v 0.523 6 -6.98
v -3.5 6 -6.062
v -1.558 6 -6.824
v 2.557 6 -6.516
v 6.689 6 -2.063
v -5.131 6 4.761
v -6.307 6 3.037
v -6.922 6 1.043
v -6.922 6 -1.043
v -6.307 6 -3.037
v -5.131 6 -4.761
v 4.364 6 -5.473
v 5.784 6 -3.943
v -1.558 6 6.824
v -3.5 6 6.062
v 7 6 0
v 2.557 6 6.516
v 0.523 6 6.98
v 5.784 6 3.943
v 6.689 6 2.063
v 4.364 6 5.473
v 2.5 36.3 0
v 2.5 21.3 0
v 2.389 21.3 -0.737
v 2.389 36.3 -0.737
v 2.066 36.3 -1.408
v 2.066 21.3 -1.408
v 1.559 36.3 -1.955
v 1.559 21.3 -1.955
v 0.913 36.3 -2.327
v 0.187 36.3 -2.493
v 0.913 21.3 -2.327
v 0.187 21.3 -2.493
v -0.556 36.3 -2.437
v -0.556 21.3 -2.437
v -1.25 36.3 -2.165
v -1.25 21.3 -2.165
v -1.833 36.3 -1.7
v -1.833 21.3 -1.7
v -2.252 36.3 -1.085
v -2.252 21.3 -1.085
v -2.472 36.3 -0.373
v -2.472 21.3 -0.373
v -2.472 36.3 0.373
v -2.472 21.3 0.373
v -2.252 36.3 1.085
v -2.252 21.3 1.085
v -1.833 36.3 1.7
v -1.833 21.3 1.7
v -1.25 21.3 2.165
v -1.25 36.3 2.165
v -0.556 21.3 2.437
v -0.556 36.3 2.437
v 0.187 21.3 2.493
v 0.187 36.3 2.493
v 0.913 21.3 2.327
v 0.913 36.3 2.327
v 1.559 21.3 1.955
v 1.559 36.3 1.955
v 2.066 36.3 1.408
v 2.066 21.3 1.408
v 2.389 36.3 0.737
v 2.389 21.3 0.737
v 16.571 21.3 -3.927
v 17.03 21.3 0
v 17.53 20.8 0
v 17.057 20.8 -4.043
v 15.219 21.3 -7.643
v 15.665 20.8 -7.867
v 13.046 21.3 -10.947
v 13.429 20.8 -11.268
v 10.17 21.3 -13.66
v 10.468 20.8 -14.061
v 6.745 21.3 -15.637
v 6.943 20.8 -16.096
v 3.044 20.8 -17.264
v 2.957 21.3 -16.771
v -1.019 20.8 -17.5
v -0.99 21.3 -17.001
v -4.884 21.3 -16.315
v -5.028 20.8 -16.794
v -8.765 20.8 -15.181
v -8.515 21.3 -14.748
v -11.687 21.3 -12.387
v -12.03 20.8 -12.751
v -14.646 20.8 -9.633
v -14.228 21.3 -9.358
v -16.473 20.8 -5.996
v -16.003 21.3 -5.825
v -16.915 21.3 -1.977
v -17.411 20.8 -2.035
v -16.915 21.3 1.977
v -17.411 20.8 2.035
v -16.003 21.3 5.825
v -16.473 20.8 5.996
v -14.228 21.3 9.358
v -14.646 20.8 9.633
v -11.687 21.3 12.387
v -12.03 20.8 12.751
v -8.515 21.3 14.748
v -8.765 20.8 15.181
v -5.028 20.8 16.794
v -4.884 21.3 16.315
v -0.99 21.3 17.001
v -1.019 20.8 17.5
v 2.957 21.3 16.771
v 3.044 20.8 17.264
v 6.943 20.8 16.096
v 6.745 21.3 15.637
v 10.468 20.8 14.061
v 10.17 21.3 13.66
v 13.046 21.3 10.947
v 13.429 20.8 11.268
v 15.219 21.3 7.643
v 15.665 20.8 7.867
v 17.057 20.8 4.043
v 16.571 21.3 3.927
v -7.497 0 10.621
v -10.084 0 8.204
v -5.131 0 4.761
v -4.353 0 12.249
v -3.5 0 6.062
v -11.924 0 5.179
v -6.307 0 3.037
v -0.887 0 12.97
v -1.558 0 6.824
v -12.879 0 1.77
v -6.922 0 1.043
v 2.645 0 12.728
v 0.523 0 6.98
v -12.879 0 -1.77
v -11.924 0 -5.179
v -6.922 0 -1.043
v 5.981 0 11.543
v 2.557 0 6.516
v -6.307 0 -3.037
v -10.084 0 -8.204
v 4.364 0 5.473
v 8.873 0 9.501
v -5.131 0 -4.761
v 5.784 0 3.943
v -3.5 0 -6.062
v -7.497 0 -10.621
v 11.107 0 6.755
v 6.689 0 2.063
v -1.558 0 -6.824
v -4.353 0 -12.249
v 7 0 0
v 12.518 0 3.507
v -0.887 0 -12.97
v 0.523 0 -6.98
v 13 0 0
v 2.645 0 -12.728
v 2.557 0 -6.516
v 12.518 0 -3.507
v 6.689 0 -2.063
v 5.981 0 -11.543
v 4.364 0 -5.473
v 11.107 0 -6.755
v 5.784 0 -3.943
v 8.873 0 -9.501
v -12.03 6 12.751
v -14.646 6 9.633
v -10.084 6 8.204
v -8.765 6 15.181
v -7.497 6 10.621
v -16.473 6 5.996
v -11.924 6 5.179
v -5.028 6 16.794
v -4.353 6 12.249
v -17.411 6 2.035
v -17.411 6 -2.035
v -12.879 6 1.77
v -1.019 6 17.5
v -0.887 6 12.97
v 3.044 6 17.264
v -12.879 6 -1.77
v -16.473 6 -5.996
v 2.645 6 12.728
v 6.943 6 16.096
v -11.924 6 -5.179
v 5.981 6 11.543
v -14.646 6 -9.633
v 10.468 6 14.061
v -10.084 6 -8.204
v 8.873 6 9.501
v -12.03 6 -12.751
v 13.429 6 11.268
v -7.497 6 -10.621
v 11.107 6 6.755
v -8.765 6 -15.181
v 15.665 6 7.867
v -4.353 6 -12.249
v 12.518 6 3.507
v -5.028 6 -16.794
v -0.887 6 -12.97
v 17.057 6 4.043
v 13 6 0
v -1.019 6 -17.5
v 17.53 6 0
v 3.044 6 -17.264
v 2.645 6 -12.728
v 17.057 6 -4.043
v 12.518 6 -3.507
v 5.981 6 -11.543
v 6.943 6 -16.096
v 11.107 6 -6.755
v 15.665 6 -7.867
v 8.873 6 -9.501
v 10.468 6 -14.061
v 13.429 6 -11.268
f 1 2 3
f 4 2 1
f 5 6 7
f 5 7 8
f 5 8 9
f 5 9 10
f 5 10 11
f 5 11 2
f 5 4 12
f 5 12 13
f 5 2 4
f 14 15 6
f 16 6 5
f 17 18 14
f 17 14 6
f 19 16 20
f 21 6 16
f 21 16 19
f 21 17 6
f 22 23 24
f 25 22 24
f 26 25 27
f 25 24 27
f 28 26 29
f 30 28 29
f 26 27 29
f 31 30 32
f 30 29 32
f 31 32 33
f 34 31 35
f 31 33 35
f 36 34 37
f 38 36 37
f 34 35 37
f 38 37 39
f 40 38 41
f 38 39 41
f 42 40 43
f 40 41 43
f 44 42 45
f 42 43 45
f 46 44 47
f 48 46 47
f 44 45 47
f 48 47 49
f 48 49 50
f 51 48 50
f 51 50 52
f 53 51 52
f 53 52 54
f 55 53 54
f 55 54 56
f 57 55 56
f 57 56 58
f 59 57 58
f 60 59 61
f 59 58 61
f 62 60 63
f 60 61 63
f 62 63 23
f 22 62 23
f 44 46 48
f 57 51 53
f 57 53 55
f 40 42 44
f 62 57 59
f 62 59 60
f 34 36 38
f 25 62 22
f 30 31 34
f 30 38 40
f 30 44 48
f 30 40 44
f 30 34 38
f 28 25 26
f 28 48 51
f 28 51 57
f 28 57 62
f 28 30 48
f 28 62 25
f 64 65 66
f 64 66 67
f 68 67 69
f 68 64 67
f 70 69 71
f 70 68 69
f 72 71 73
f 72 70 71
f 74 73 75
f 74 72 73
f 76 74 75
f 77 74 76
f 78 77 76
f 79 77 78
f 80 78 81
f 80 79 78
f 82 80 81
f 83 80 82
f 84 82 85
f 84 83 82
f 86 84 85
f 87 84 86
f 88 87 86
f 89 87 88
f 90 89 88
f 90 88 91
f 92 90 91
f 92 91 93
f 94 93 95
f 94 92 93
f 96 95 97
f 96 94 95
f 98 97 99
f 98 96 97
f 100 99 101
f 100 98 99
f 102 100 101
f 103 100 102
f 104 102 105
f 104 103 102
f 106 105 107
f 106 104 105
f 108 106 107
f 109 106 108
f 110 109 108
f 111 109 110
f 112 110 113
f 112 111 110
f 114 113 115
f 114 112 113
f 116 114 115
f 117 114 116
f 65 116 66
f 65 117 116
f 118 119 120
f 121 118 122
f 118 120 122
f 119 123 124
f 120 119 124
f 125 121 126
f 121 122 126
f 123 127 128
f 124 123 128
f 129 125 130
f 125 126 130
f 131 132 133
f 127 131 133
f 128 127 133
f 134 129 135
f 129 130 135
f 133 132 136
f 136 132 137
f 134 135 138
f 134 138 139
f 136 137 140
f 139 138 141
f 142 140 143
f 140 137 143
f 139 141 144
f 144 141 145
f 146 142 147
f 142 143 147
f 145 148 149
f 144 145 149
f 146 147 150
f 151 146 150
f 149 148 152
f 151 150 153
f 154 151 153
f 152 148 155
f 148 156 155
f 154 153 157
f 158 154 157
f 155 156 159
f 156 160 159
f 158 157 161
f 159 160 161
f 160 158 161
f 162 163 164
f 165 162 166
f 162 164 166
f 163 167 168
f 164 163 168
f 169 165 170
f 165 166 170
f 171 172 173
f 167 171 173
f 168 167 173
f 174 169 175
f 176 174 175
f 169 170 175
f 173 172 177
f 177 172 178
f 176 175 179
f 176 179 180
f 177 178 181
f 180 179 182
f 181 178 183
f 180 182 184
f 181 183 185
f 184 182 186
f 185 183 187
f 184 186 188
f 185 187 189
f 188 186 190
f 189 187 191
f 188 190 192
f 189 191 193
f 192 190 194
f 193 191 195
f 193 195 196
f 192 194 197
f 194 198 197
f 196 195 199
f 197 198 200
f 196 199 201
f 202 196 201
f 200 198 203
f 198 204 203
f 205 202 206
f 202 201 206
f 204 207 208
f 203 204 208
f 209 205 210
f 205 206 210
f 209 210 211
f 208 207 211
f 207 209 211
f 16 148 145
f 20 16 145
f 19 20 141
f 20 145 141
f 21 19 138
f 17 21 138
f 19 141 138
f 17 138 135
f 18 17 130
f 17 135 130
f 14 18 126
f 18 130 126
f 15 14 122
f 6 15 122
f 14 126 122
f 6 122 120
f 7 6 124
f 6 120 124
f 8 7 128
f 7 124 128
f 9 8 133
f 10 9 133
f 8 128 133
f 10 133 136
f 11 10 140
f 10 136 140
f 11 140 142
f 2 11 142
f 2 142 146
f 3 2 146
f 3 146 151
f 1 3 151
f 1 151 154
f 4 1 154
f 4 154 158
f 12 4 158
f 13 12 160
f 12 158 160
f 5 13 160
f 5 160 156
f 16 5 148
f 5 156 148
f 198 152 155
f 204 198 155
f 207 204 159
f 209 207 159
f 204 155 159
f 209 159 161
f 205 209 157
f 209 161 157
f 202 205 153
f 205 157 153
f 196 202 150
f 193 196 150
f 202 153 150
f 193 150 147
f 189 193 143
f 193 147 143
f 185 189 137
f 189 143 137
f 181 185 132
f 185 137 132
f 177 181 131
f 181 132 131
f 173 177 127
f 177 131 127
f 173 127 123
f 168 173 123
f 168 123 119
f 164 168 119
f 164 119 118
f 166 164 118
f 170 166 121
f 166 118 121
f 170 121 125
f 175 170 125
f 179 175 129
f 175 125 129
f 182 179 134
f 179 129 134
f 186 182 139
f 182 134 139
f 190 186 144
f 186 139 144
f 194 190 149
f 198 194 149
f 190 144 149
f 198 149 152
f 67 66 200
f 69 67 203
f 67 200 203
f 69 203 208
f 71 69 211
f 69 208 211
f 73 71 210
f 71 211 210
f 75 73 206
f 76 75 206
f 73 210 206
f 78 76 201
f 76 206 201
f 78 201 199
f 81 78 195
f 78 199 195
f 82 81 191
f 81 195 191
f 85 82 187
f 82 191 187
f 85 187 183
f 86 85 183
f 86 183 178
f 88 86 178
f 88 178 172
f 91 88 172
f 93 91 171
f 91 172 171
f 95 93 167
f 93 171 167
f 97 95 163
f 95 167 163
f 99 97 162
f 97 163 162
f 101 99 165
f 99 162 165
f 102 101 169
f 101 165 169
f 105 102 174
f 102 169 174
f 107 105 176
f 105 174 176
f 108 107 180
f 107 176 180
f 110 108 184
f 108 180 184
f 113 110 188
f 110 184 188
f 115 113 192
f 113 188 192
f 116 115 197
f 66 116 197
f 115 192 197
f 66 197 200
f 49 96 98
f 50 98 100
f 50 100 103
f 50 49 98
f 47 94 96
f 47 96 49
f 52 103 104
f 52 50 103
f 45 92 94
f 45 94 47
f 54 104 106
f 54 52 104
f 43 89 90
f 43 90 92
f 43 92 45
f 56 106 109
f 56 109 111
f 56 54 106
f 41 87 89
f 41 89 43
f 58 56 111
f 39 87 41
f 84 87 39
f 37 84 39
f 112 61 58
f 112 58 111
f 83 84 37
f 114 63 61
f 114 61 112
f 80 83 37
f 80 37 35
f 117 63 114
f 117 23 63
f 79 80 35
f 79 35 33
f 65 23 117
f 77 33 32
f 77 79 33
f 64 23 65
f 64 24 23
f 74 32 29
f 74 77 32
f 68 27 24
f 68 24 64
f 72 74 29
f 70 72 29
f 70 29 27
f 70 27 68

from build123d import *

# Parameters (mm, degrees)
SKETCH1_R           = 13
BOSS_EXTRUDE1_DEPTH = 6
SKETCH2_R           = 17.53
BOSS_EXTRUDE2_DEPTH = 15.3
SKETCH3_R           = 2.5
BOSS_EXTRUDE3_DEPTH = 15
CHAMFER1_SIZE       = 0.5
SKETCH4_R           = 7
CUT_EXTRUDE1_DEPTH  = 6


with BuildPart() as part:
    # Sketch1 → Boss-Extrude1 (new body)
    with BuildSketch(Plane(origin=(0, 0, 0), x_dir=(1, 0, 0), z_dir=(0, 1, 0))):
        Circle(SKETCH1_R)
    extrude(amount=BOSS_EXTRUDE1_DEPTH)

    # Sketch2 → Boss-Extrude2 (add)
    with BuildSketch(Plane(origin=(0, 6, 0), x_dir=(1, 0, 0), z_dir=(0, 1, 0))):
        Circle(SKETCH2_R)
    extrude(amount=BOSS_EXTRUDE2_DEPTH)

    # Sketch3 → Boss-Extrude3 (add)
    with BuildSketch(Plane(origin=(0, 21.3, 0), x_dir=(1, 0, 0), z_dir=(0, 1, 0))):
        Circle(SKETCH3_R)
    extrude(amount=BOSS_EXTRUDE3_DEPTH)

    # Chamfer1
    chamfer1_edges = [part.edges().sort_by_distance(p)[0] for p in [
        (-17.53, 21.3, 0),
    ]]
    chamfer(chamfer1_edges, length=CHAMFER1_SIZE)

    # Sketch4 → Cut-Extrude1 (cut)
    with BuildSketch(Plane.XZ):
        Circle(SKETCH4_R)
    extrude(amount=-CUT_EXTRUDE1_DEPTH, mode=Mode.SUBTRACT)


solid = part.part
